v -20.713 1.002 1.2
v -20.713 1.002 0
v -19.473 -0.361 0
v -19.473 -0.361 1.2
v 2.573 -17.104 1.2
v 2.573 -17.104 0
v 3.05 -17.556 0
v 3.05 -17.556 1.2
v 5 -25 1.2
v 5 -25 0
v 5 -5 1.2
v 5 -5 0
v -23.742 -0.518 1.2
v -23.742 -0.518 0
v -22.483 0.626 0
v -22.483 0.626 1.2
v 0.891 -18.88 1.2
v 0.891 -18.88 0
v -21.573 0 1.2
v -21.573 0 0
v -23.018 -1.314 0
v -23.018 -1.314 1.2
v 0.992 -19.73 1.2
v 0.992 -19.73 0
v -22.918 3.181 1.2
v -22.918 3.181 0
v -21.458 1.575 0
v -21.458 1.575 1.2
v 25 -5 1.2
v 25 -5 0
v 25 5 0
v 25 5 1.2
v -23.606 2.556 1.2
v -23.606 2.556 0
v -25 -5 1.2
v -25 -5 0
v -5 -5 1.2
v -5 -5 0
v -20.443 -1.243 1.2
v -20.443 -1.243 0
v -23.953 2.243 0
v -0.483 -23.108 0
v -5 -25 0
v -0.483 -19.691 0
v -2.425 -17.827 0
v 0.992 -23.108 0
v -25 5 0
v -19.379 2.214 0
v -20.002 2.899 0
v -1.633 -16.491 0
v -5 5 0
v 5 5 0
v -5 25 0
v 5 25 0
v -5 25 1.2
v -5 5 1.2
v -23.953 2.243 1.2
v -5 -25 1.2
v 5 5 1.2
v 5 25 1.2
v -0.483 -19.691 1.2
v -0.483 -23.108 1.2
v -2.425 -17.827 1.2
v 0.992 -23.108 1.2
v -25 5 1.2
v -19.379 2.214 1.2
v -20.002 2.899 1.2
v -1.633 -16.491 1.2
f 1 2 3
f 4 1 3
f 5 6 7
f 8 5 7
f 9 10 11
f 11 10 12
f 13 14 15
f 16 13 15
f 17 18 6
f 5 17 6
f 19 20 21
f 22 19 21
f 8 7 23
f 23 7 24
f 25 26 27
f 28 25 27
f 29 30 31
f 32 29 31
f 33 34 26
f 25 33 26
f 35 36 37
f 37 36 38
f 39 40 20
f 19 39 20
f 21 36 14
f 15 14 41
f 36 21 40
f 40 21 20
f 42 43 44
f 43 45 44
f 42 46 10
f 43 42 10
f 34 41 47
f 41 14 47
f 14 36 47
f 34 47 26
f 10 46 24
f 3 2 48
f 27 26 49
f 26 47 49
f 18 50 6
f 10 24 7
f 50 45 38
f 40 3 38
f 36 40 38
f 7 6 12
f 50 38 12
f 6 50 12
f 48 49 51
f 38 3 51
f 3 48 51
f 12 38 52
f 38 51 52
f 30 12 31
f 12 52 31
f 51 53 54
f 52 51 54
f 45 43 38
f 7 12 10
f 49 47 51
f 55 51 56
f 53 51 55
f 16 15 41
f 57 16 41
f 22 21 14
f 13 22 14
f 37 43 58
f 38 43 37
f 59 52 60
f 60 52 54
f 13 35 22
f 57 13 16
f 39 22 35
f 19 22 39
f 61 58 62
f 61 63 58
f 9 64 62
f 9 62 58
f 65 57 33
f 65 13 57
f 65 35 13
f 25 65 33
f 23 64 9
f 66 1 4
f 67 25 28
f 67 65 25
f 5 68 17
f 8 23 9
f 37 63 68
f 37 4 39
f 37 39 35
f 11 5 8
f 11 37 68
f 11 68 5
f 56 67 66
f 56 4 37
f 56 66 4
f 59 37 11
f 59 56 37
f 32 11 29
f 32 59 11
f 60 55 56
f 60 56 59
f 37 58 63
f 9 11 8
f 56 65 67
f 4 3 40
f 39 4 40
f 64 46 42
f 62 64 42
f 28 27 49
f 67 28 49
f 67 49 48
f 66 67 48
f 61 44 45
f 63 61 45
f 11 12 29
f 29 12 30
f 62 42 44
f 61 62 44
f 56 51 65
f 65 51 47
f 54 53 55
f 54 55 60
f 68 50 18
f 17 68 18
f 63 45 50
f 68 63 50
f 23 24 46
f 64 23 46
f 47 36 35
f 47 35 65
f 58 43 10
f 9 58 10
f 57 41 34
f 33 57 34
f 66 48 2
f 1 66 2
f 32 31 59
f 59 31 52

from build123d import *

# Parameters (mm, degrees)
F0_W     = 20
F0_H     = 10
F0_W_2   = 10
F0_H_2   = 20
F1_DEPTH = 1.2


with BuildPart() as f1:
    # F0 (on Top) → F1 (new body)
    with BuildSketch(Plane.XY):
        with Locations((-15, 0)):
            Rectangle(F0_W, F0_H)
        Polygon((-23.952800427, 2.2430510182), (-23.6059203744, 2.5555547327), (-22.9180995375, 3.1808458734), (-21.4581449046, 1.5748944182), (-20.0015842271, 2.899039368), (-19.379123235, 2.2143316973), (-20.7127477867, 1.0019467672), (-19.4734830842, -0.3612455592), (-20.4429661396, -1.2425930456), (-21.572595225, 0), (-23.0182641957, -1.3142434066), (-23.7418717627, -0.5182744093), (-22.4829424203, 0.6262058426), align=None, mode=Mode.SUBTRACT)
        Rectangle(F0_W_2, F0_H)
        with Locations((15, 0)):
            Rectangle(F0_W, F0_H)
        with Locations((0, 15)):
            Rectangle(F0_W_2, F0_H_2)
        with Locations((0, -15)):
            Rectangle(F0_W_2, F0_H_2)
        Polygon((-0.4832326085, -19.6910500526), (-2.4245390669, -17.8273953497), (-1.6327861698, -16.4912146452), (0.8914793769, -18.8802530514), (2.5726677996, -17.1039040391), (3.0499449931, -17.5556130707), (0.9921601741, -19.7298750281), (0.9921601741, -23.1077484787), (-0.4832326085, -23.1077484787), align=None, mode=Mode.SUBTRACT)
    extrude(amount=F1_DEPTH)


solid = f1.part
